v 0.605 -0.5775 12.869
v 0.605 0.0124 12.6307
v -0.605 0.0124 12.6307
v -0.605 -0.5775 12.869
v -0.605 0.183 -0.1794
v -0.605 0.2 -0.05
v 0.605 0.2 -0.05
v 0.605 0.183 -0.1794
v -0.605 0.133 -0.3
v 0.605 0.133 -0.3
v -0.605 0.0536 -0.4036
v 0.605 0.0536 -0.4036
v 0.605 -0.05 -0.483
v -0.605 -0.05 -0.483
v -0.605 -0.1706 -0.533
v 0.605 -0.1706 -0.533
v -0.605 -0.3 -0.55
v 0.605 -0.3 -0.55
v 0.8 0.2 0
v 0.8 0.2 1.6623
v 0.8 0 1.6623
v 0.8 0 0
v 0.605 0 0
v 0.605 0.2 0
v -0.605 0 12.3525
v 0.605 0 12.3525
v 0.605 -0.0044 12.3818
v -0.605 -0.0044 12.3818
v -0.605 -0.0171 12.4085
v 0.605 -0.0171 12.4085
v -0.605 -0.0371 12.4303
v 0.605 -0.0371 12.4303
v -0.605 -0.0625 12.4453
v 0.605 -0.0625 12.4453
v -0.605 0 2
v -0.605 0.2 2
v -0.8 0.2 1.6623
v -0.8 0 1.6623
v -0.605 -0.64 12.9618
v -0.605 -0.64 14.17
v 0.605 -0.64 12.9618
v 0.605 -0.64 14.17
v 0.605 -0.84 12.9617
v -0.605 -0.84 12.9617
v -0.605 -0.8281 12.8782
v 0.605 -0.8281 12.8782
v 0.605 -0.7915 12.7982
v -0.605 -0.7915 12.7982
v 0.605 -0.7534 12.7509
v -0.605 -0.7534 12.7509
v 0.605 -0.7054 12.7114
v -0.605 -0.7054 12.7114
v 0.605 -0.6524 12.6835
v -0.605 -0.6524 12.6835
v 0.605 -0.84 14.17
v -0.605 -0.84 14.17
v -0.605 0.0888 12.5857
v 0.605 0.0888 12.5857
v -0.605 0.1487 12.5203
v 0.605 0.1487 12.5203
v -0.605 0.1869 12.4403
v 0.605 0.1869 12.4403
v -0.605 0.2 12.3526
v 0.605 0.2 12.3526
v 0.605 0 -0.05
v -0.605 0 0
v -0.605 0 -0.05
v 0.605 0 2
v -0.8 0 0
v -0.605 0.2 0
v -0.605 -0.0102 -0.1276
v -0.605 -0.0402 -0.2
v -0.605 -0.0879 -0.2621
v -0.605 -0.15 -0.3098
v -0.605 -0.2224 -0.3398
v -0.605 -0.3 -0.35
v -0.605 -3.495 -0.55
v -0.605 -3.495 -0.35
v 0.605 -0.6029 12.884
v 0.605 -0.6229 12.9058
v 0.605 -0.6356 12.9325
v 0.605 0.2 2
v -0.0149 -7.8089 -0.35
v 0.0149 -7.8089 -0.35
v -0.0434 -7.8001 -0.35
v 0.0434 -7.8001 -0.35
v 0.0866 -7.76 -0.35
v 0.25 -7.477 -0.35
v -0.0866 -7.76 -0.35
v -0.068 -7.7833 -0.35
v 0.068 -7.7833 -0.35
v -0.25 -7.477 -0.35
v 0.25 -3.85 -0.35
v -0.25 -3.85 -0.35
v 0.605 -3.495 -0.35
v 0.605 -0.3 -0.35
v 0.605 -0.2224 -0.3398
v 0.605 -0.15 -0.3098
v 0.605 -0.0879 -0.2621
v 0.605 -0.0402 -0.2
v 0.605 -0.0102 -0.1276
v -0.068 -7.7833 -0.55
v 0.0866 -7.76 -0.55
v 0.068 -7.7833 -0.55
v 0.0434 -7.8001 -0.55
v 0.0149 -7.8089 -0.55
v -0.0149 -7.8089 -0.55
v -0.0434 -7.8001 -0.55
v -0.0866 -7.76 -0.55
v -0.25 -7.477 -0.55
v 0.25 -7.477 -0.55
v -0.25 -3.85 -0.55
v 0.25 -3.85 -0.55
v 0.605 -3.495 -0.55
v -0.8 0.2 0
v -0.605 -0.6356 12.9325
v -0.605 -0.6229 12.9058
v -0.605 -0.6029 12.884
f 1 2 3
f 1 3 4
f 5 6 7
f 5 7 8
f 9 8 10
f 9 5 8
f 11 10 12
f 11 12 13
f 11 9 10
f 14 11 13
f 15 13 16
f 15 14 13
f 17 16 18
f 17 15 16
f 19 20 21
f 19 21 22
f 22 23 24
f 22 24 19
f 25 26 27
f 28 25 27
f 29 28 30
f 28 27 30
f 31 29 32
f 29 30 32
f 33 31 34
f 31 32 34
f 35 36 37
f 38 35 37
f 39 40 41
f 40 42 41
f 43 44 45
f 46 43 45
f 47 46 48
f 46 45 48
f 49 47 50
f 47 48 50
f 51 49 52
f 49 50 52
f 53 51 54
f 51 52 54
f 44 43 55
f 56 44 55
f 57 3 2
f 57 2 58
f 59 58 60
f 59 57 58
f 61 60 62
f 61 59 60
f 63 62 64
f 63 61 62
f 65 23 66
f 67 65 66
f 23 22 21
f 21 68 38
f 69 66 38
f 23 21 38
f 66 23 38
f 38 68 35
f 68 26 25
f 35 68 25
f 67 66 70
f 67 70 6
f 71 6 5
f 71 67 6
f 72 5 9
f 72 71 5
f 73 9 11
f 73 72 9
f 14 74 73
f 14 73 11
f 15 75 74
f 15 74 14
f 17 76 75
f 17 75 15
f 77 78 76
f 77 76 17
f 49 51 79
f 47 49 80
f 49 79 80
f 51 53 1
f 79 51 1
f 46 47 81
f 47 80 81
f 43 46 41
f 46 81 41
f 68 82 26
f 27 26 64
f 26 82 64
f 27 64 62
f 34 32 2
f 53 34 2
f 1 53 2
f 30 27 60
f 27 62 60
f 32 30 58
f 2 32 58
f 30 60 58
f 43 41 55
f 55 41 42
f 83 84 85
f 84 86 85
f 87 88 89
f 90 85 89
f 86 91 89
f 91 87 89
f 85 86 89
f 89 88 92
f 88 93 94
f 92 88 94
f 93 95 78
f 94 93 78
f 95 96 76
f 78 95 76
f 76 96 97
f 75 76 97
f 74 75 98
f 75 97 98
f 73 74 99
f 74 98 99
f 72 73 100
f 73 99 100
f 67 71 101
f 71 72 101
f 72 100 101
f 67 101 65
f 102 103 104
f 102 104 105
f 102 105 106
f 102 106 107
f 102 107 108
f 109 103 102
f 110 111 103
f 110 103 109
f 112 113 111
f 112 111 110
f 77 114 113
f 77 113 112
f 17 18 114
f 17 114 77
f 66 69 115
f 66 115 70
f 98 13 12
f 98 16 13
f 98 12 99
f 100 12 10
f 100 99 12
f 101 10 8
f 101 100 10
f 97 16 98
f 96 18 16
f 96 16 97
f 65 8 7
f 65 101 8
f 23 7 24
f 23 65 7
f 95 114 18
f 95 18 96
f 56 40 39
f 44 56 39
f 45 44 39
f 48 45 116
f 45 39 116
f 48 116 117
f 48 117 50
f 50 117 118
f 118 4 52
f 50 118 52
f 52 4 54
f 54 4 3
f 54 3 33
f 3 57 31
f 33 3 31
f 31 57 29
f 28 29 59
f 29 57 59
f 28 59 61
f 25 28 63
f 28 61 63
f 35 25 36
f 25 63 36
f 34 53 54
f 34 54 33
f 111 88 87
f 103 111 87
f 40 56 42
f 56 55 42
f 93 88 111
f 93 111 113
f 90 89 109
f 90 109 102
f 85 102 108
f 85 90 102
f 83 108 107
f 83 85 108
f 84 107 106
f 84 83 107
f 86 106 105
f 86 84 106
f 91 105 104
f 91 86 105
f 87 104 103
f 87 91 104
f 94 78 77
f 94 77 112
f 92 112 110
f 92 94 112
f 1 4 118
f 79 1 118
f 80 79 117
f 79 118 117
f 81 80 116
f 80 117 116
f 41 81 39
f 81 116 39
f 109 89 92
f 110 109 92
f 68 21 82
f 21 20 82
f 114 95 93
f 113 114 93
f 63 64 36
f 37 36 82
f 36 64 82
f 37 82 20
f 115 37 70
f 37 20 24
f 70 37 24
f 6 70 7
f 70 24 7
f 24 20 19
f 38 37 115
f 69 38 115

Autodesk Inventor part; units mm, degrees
ref_plane "YZ Plane" through (0, 0, 0) normal (1, 0, 0) x (0, 1, 0)
ref_plane "XZ Plane" through (0, 0, 0) normal (0, 1, 0) x (-1, 0, 0)
ref_plane "XY Plane" through (0, 0, 0) normal (0, 0, 1) x (1, 0, 0)
sketch "Sketch1" plane through (0, 0, 0) normal (0, 1, 0) x (-1, 0, 0)
  line L0 (-0.8, 12.42) -> (0.8, 12.42)
  line L1 (0.8, 12.42) -> (0.8, 0)
  line L2 (0.8, 0) -> (-0.8, 0)
  line L3 (-0.8, 0) -> (-0.8, 12.42)
  line L4 (-0.8, 12.42) -> (0.8, 0) construction
  line L5 (0.8, 12.42) -> (-0.8, 0) construction
  line L6 (1.12, 0) -> (-1.12, 0) projected
  line L7 (0, -2.904) -> (0, 14.974) projected
  line L8 (-0.605, 0) -> (0.605, 0)
  line L9 (0.605, 0) -> (0.605, -0.35)
  line L10 (0.605, -0.35) -> (-0.605, -0.35)
  line L11 (-0.605, -0.35) -> (-0.605, 0)
  point P0 (0, 6.21)
  point P1 (-1.12, 0)
  point P2 (0, 6.21)
  dimension "d0" = 1.6
  dimension "d3" = 12.42
  dimension "d12" = 1.21
  dimension "d13" = 0.35
extrude "Extrusion1" add sketch "Sketch1" along normal blind 0.2
sketch "Sketch2" plane through (0.8, 0, 12.42) normal (1, 0, 0) x (0, 0, -1)
  line L0 (0, 0.2) -> (12.42, 0.2) projected
  line L1 (-0.1349, 0.2) -> (-0.4743, -0.64)
  line L2 (-0.4743, -0.64) -> (-0.2888, -0.7149)
  line L3 (-0.2888, -0.7149) -> (0, 0)
  line L4 (0, 0) -> (12.42, 0) projected
  line L5 (-0.1349, 0.2) -> (0, 0.2)
  line L6 (0, 0) -> (0, 0.2) projected
  line L7 (0, 0.2) -> (0, 0)
  dimension "d46" = 0.2
  dimension "d47" = 112
  dimension "d48" = 112
  dimension "d49" = 0.64
extrude "Extrusion2" add sketch "Sketch2" against normal up to surface (1.6 mm away)
sketch "Sketch3" plane through (0.8, -0.84, 14.02) normal (1, 0, 0) x (0, 0, -1)
  line L0 (14.02, 0.84) -> (1.6, 0.84) projected
  line L1 (-0.15, 0.2) -> (1.3414, 0.2)
  line L2 (1.3414, 0.2) -> (1.2606, 0)
  line L3 (1.2606, 0) -> (-0.15, 0)
  line L4 (-0.15, 0) -> (-0.15, 0.2)
  line L5 (1.3112, 0.1251) -> (1.6, 0.84) projected
  point P0 (1.1257, 0.2)
  dimension "d52" = 0.2
  dimension "d53" = 1.75
extrude "Extrusion3" add sketch "Sketch3" against normal up to surface (1.6 mm away)
sketch "Sketch4" plane through (0.605, 0, -0.35) normal (0, 0, -1) x (-1, 0, 0)
  line L0 (0, 0) -> (0, 0.2) projected
  line L1 (0, 0.2) -> (1.21, 0.2)
  line L2 (1.21, 0.2) -> (1.21, -3.495)
  line L3 (1.21, -3.495) -> (0, -3.495)
  line L4 (0, -3.495) -> (0, 0.2)
  line L5 (0.355, -3.495) -> (0.855, -3.495)
  line L6 (0.855, -3.495) -> (0.855, -7.81)
  line L7 (0.855, -7.81) -> (0.355, -7.81)
  line L8 (0.355, -7.81) -> (0.355, -3.495)
  line L9 (0, -3.495) -> (0.355, -3.85)
  line L10 (0, -3.495) -> (0.502, -3.495) construction
  line L11 (1.21, -3.495) -> (0.855, -3.85)
  line L12 (1.21, -3.495) -> (1.712, -3.495) construction
  line L13 (0.355, -7.477) -> (0.5184, -7.76)
  line L14 (0.6916, -7.76) -> (0.855, -7.477)
  arc A0 (0.5184, -7.76) -> (0.6916, -7.76) centre (0.605, -7.71) ccw
  line L15 (0.355, -7.477) -> (0.855, -7.477) construction
  point P0 (0.605, 0)
  dimension "d14" = 1.21
  dimension "d16" = 0.5
  dimension "d17" = 4.315
  dimension "d18" = 0.355
  dimension "d19" = 0.355
  dimension "d20" = 45
  dimension "d21" = 135
  dimension "d26" = 0.1
  dimension "d28" = 150
  dimension "d29" = 150
  dimension "d30" = 4.05
extrude "Extrusion4" add sketch "Sketch4" along normal blind 0.2 contours L0 L1 L2 L3 L4 | L3 L8 L9 | L3 L6 L14 A0 L13 L8 | L11 L6 L3
sketch "Sketch5" plane through (0, 0.2, 0) normal (0, 1, 0) x (1, 0, 0)
  line L0 (0.8, 0) -> (0.8, -12.42) projected
  line L1 (0.8, -1.6623) -> (0.605, -2)
  line L2 (-0.605, -2) -> (-0.8, -1.6623)
  line L3 (-0.8, 0) -> (-0.8, -12.5549) projected
  line L4 (0.8, -1.6623) -> (-0.8, -1.6623) construction
  line L5 (0.8, 0) -> (0.605, 0) construction
  line L6 (-0.605, 0) -> (-0.8, 0) construction
  line L7 (0.8, -1.6623) -> (0.8, -14.17)
  line L8 (-0.8, -14.17) -> (-0.8, -1.6623)
  line L9 (0.605, -2) -> (0.605, -14.17)
  line L10 (-0.605, -14.17) -> (-0.605, -2)
  line L11 (0.8, -14.17) -> (0.605, -14.17)
  line L12 (0, 3.504) -> (0, -17.174) projected
  line L13 (0.8, -14.17) -> (-0.8, -14.17) projected
  line L14 (-0.605, -14.17) -> (-0.8, -14.17)
  line L15 (-0.8, -12.8943) -> (-0.8, -14.17) projected
  point P0 (0, 0)
  point P1 (0.8, -12.62)
  point P2 (-0.8, -12.82)
  point P3 (-0.8, -12.62)
  dimension "d35" = 1.21
  dimension "d38" = 30
  dimension "d39" = 30
  dimension "d40" = 2
extrude "Extrusion5" cut sketch "Sketch5" against normal up to surface (1.04 mm away)
fillet "Fillet1" radius 0.3 1 edges at (0, 0, -0.35)
fillet "Fillet1" radius 0.5 1 edges at (0, 0.2, -0.55)
fillet "Fillet2" radius 0.3 2 edges at (0, 0.2, 12.5549) (0, -0.84, 12.7594)
fillet "Fillet2" radius 0.1 2 edges at (0, 0, 12.42) (0, -0.64, 12.8943)
equation "\"d48\" = d47"
equation "\"d18\" = d19"
equation "\"d39\" = d38"
equation "\"BendReliefWidth\" = Thickness"
equation "\"BendReliefDepth\" = 0.5 * Thickness"
equation "\"CornerReliefSize\" = 4 * Thickness"
equation "\"MinimumRemnant\" = 2 * Thickness"
equation "\"TransitionRadius\" = BendRadius"
equation "\"JacobiRadiusSize\" = BendRadius"
equation "\"GapSize\" = Thickness"
equation "\"Thickness\" = 0.2"
equation "\"BendRadius\" = 0.01"
properties part number "USB 3.0 A Recepticle Upper Pin" material "Nickel-Copper Alloy 400"
